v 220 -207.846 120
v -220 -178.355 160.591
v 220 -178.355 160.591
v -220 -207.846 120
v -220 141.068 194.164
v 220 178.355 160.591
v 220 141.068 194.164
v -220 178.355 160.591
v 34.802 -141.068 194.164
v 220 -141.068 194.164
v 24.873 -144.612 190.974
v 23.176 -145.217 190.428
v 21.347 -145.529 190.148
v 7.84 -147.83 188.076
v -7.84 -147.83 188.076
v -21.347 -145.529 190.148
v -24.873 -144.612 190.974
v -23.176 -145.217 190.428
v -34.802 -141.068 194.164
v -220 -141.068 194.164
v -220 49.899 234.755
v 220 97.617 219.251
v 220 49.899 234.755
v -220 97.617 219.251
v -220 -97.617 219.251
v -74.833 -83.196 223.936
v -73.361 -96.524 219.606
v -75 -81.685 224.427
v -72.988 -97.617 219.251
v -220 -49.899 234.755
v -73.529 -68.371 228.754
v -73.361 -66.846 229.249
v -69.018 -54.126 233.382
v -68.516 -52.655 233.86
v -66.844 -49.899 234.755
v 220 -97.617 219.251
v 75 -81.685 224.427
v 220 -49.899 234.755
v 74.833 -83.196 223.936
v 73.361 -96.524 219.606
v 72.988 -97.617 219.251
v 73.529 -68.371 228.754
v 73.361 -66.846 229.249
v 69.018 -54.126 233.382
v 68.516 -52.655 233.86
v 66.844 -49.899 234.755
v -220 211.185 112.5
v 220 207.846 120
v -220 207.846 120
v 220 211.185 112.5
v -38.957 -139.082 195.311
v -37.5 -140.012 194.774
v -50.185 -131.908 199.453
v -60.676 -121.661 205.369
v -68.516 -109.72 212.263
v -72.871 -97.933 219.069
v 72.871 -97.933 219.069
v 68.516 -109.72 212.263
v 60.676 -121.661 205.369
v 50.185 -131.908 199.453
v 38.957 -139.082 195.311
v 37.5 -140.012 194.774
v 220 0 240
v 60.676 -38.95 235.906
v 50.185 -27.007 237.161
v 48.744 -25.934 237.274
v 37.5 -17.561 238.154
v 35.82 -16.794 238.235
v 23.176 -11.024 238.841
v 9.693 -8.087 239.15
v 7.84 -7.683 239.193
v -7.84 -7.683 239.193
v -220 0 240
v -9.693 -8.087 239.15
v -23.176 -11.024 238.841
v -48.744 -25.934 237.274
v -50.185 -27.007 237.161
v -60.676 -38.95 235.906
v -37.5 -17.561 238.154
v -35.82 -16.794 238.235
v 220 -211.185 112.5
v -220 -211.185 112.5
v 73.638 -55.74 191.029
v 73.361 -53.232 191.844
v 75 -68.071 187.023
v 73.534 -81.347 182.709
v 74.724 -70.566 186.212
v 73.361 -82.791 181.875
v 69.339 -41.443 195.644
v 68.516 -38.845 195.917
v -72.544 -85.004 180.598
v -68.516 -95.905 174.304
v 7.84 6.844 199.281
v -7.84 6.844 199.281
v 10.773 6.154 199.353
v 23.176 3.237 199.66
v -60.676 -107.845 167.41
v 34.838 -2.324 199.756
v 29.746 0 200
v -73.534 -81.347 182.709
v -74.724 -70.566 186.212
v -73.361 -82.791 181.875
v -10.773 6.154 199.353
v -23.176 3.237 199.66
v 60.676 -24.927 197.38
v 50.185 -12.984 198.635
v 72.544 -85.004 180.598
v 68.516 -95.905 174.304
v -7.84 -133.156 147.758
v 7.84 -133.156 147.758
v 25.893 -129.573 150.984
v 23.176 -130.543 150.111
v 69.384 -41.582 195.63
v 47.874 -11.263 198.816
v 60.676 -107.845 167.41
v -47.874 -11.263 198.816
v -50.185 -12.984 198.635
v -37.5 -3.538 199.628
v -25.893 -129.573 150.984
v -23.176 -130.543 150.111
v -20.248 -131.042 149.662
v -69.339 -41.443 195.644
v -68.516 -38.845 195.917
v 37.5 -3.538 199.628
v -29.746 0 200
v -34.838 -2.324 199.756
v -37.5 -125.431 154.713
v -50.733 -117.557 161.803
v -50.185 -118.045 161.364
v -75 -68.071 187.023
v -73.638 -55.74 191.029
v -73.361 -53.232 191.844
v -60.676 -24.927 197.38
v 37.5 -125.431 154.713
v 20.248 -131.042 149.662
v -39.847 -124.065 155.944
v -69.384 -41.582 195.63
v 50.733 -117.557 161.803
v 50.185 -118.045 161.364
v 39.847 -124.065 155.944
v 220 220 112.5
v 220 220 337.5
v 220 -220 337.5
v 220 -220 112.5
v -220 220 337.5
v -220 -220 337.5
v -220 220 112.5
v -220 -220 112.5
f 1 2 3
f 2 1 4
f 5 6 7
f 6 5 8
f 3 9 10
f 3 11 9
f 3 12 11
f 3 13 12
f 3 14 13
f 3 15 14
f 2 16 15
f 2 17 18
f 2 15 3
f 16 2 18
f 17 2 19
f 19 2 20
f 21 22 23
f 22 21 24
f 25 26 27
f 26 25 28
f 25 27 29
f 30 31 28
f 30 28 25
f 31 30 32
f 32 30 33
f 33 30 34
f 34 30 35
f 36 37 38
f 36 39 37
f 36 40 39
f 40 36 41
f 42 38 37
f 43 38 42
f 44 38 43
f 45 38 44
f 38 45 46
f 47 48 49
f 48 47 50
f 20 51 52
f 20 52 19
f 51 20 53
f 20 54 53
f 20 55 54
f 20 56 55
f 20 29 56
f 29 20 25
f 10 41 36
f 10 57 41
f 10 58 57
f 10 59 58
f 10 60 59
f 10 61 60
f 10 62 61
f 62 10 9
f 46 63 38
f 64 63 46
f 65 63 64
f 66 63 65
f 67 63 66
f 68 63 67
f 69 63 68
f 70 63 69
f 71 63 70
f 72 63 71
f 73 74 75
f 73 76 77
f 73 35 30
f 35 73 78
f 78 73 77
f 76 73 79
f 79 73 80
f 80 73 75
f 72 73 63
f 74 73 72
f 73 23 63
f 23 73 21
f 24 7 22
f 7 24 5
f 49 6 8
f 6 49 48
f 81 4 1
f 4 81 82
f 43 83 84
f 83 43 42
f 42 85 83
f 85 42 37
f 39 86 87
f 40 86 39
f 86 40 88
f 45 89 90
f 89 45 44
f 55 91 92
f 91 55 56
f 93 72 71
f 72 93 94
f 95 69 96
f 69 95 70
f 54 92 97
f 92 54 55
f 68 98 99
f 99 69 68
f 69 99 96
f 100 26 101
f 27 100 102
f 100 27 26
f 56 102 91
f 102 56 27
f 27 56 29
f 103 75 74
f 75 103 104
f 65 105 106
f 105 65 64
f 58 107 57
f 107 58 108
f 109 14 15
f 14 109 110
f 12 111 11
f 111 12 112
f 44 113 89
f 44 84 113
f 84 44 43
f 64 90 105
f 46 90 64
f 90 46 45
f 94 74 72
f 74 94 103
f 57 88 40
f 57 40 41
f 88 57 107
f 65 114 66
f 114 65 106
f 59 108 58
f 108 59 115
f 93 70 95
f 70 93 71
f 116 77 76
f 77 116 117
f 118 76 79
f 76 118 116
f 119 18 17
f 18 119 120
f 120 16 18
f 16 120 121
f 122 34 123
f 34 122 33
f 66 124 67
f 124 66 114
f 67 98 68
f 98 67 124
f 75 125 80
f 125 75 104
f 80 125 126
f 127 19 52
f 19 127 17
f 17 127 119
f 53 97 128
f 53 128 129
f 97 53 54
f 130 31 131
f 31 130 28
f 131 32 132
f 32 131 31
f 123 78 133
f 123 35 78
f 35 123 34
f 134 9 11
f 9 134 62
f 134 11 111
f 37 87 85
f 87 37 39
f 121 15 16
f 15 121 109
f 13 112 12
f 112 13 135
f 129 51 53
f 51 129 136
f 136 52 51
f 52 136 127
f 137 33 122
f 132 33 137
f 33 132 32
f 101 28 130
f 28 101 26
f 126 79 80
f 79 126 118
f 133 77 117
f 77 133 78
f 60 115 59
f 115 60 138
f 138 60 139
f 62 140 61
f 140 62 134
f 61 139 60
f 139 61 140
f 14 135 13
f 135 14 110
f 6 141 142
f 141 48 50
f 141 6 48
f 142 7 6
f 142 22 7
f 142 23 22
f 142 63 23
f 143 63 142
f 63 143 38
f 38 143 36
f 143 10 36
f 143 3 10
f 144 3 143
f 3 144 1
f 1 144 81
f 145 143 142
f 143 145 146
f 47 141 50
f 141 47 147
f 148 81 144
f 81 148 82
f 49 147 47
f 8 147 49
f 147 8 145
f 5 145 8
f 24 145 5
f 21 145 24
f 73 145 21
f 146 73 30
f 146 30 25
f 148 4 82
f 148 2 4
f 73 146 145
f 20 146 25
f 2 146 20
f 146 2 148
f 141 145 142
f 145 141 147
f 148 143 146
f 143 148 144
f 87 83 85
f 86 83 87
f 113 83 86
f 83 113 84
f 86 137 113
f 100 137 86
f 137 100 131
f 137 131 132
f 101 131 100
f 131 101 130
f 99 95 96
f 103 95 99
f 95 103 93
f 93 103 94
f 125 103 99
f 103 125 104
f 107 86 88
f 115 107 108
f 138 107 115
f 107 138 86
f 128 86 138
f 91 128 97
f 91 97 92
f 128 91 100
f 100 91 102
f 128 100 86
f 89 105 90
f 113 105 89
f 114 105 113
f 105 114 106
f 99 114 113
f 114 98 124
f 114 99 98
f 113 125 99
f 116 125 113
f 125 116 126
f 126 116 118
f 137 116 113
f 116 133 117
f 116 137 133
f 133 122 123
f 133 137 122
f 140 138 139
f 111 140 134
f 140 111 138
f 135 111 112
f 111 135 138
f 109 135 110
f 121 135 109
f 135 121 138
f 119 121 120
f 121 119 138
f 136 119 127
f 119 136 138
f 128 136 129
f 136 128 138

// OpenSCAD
dia = 480;
width = 450;
nudge = 2;

degree = 20;
pinDia = 150;

difference() {


difference() {
    translate([0,0,width/2]){
        cube([width-10,width-10,width/2],center=true);
    }

    difference() {
        translate([-width/2,0,0]) {
            rotate(a=[0,90,0]) {
                cylinder(h=width,d=dia);
            };
        }
        rotate(a=[degree,0,0]) {
            cylinder(h=600,d=pinDia,center=true);
        };
    };
}
translate([-width/2,0,0]) {
    rotate(a=[0,90,0]) {
        cylinder(h=width,d=dia-80);
    };
}
}
